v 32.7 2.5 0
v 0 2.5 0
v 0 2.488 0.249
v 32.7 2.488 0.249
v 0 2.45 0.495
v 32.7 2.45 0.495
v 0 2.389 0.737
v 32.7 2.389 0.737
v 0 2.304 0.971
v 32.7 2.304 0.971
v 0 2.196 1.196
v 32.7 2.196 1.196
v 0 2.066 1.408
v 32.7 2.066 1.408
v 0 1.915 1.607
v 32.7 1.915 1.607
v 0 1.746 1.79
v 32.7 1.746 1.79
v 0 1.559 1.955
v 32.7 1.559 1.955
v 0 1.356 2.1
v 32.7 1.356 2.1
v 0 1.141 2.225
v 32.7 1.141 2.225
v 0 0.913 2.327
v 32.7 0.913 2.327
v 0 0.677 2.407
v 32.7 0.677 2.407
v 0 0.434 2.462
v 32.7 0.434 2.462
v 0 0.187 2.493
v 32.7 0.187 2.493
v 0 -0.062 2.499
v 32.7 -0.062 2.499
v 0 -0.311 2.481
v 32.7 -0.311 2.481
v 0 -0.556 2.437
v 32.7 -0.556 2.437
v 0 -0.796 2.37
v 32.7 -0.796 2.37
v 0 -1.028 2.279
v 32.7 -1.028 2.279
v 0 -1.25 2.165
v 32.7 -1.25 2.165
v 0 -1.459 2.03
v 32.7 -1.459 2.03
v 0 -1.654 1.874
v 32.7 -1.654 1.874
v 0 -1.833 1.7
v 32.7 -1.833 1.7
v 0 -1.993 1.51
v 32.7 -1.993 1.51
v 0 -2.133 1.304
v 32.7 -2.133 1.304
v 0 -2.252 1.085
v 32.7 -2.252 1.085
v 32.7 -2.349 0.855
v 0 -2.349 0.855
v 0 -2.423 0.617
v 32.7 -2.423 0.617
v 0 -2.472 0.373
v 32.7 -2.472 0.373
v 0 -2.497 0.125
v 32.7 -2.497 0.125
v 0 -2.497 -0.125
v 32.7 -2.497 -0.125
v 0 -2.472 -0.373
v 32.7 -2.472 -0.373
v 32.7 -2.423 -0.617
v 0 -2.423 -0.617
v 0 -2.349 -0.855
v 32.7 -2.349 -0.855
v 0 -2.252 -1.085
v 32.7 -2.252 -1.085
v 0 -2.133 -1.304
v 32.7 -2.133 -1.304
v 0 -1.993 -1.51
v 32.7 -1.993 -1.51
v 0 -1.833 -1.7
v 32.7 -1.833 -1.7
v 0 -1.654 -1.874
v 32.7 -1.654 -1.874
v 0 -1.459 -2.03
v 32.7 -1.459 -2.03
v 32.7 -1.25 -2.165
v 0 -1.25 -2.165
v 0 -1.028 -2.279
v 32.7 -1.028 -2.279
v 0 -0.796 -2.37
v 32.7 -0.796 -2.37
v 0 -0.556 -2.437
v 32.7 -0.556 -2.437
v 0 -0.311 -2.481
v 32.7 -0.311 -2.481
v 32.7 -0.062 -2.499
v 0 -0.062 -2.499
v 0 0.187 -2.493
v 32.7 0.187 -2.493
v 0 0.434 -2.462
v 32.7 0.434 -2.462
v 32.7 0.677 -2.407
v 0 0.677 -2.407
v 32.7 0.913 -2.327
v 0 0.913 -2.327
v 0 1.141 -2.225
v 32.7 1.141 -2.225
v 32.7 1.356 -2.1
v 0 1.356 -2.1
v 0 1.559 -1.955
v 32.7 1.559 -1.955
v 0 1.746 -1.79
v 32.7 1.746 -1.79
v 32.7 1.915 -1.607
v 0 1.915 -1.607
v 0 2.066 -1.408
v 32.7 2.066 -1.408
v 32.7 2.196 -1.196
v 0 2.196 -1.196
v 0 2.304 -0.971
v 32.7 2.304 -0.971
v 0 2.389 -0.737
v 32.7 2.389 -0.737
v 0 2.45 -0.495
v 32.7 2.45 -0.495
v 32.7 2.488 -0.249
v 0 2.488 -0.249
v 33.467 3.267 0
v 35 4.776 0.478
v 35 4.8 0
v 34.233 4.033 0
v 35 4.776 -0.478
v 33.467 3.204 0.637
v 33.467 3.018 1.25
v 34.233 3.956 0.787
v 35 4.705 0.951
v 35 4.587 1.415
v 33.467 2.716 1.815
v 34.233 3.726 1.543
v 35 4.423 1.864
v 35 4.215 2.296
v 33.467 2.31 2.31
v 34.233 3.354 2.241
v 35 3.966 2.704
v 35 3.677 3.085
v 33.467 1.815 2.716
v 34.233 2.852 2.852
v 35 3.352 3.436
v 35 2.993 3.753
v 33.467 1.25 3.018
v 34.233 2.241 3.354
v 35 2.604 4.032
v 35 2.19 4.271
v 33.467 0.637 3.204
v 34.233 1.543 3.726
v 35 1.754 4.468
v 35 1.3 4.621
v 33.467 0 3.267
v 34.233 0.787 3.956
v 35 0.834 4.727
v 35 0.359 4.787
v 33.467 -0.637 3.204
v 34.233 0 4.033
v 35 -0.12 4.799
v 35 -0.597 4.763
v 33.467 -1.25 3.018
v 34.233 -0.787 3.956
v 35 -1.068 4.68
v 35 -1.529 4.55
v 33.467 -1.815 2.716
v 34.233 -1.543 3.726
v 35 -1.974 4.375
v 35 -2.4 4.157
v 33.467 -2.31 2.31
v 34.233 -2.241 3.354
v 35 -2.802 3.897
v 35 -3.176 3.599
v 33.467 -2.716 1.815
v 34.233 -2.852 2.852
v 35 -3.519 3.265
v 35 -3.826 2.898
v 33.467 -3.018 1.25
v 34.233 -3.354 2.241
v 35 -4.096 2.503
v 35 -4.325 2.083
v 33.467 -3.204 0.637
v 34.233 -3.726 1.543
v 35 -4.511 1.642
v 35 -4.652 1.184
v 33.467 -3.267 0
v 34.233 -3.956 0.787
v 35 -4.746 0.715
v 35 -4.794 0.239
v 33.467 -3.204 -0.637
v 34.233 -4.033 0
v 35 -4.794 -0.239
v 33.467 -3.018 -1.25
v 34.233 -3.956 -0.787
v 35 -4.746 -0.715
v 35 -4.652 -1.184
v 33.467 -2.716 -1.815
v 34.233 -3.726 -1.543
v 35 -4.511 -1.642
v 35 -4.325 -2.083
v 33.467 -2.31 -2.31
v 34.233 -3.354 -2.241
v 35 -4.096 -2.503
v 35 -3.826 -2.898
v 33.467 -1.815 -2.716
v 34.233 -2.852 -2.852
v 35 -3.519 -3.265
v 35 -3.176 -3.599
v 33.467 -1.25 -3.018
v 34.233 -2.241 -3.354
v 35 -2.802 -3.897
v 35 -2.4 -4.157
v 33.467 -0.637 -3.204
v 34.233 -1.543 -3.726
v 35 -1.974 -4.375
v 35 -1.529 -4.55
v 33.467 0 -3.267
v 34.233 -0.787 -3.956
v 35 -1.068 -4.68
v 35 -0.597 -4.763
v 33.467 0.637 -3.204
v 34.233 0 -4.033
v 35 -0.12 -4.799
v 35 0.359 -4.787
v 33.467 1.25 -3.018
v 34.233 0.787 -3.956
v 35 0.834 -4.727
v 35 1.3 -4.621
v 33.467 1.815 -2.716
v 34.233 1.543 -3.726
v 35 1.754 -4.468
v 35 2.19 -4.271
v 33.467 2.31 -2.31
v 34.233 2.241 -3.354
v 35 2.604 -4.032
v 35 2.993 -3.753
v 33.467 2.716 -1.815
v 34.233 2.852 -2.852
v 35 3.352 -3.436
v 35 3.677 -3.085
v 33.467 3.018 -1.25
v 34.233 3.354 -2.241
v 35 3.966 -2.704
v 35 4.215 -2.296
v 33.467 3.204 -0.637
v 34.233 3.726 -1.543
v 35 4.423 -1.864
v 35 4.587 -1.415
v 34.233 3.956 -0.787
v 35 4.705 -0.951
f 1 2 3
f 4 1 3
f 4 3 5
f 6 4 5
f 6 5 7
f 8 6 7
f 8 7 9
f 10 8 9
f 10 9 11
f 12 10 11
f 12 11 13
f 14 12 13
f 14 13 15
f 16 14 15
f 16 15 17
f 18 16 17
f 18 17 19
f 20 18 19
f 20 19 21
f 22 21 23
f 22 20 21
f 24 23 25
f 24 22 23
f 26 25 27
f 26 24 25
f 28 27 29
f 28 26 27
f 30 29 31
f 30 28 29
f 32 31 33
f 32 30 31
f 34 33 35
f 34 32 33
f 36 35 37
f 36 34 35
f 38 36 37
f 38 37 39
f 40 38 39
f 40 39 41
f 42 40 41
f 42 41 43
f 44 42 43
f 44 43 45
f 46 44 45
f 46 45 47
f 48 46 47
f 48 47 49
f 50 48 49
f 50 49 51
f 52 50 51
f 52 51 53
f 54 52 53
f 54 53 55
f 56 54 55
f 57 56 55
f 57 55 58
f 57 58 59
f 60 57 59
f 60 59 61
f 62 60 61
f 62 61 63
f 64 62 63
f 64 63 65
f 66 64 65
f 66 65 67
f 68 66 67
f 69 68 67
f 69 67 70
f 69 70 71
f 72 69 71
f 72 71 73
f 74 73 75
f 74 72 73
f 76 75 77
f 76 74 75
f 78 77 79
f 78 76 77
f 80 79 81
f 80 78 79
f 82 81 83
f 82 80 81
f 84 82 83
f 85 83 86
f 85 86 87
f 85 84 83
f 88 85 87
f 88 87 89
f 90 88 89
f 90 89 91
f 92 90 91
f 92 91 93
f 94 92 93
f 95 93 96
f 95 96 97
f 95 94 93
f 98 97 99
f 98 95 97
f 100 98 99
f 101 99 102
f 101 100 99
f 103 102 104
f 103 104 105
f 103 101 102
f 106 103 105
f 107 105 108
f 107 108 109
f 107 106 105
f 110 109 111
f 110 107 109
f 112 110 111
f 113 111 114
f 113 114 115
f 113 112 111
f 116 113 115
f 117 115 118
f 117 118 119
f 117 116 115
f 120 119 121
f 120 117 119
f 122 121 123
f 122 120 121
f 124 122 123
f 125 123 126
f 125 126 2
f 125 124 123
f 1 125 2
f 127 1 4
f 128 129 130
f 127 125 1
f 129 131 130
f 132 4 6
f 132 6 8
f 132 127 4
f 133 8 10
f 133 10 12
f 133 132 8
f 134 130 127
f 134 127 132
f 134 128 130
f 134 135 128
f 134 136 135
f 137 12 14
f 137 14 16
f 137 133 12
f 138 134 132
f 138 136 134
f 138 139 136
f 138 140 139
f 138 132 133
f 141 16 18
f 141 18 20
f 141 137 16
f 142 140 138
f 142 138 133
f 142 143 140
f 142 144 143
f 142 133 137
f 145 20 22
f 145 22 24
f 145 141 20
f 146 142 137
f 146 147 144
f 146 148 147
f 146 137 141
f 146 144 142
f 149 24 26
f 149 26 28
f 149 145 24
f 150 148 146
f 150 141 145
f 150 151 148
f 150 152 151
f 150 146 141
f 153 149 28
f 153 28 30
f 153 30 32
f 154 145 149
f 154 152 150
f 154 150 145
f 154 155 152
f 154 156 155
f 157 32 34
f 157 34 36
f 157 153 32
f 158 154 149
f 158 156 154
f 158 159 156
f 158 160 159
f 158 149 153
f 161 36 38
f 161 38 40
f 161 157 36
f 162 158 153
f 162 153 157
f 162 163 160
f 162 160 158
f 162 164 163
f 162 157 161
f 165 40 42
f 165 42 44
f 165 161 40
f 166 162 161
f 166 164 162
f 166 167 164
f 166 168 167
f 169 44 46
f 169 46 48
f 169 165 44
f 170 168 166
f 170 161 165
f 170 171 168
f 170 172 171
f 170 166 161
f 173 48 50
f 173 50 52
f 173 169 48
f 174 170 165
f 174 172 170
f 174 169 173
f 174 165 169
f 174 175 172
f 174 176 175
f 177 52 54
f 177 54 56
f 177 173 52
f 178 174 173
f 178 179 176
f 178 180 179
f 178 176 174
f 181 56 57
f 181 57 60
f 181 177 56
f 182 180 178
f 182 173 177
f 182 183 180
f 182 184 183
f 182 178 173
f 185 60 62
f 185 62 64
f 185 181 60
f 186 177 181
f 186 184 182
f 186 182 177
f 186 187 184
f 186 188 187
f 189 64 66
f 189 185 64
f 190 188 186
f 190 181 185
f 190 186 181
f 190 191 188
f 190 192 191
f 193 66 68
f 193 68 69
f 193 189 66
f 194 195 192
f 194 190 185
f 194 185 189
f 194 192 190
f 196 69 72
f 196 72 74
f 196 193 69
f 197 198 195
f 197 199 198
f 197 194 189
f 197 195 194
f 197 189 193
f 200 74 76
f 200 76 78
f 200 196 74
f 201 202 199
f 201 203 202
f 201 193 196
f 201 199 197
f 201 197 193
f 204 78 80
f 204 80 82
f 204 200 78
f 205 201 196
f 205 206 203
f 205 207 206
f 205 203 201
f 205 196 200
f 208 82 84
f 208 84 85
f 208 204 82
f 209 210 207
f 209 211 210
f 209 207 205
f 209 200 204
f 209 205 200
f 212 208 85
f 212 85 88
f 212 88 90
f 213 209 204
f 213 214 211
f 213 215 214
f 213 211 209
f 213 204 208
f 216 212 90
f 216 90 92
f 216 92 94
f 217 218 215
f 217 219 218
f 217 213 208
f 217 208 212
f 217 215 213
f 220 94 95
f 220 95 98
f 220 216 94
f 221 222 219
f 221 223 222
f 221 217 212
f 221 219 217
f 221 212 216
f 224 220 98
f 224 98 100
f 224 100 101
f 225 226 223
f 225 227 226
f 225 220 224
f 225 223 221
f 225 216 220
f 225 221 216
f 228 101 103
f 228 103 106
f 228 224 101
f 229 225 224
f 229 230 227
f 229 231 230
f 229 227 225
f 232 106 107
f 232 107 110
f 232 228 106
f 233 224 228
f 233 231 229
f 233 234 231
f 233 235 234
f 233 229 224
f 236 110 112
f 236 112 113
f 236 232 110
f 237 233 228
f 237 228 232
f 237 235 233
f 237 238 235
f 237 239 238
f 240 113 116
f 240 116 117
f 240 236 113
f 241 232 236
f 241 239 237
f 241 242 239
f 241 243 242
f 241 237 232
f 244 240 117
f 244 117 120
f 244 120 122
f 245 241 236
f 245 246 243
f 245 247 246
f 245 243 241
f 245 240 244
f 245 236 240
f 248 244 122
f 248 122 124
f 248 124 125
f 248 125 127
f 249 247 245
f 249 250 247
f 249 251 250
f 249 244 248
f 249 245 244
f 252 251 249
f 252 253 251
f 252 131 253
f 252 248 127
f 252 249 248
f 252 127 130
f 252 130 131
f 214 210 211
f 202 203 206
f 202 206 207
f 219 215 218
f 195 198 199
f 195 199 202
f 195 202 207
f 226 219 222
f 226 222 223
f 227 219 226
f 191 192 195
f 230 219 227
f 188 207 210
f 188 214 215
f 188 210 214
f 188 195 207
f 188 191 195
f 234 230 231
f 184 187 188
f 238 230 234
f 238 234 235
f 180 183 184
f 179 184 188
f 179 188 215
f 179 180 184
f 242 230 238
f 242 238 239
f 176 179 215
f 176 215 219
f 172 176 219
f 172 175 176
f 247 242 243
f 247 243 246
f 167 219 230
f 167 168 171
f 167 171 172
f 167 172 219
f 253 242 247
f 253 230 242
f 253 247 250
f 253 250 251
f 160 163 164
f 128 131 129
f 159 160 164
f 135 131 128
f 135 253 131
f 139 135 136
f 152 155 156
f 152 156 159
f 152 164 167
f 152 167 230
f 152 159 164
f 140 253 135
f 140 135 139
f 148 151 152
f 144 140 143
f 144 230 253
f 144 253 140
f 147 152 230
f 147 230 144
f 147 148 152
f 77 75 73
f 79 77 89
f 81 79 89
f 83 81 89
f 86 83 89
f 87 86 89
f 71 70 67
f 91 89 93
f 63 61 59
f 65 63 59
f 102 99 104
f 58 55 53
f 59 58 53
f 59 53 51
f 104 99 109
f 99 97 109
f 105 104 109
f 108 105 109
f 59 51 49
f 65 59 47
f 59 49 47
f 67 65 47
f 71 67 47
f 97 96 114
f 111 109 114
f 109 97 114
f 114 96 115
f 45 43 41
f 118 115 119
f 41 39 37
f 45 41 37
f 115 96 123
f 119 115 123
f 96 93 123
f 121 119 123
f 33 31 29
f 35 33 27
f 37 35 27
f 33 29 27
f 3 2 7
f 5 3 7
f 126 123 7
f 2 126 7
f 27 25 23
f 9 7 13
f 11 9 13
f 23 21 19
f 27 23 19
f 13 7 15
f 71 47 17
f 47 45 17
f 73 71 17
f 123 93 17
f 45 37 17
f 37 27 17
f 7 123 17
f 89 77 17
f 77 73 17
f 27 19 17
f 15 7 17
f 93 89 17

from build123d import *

# Parameters (mm, degrees)
F0_R        = 2.5
F1_DEPTH    = 35
F2_R        = 5
F2_R_2      = 2.5
F3_DEPTH    = 2.8
F4_S5_R     = 2.5
F4_T6_DEPTH = 9


# Not quite as in the source:
# - a fillet or chamfer that OpenCascade refuses, or shapes differently, is made with other operations: its cross-section is extruded or revolved along the edge and cut away or added


with BuildPart() as f1:
    # F0 (on Right) → F1 (new body)
    with BuildSketch(Plane.YZ):
        Circle(F0_R)
    extrude(amount=F1_DEPTH)

    # F2 (on face) → F3 (join)
    with BuildSketch(Plane.YZ.offset(35)):
        Circle(F2_R)
        Circle(F2_R_2, mode=Mode.SUBTRACT)
    extrude(amount=-F3_DEPTH)

    # F4: chamfer of 3 on 1 edges, made by hand


with BuildPart() as f4_tool2:
    # F4_s3 → F4_t4 (revolve)
    with BuildSketch(Plane.XY):
        Polygon((32.2, 2), (35.2, 5), (32.2, 5), align=None)
    revolve(axis=Axis((32.2, 0, 0), (1, 0, 0)))

    # F4_s5 → F4_t6 (cut, symmetric)
    with BuildSketch(Plane.YZ.offset(33.7)):
        Circle(F4_S5_R)
    extrude(amount=F4_T6_DEPTH, both=True, mode=Mode.SUBTRACT)


with BuildPart() as f1_1:
    add(f1.part)

    # F4_t1: cut F4_tool2
    add(f4_tool2.part, mode=Mode.SUBTRACT)


solid = f1_1.part
